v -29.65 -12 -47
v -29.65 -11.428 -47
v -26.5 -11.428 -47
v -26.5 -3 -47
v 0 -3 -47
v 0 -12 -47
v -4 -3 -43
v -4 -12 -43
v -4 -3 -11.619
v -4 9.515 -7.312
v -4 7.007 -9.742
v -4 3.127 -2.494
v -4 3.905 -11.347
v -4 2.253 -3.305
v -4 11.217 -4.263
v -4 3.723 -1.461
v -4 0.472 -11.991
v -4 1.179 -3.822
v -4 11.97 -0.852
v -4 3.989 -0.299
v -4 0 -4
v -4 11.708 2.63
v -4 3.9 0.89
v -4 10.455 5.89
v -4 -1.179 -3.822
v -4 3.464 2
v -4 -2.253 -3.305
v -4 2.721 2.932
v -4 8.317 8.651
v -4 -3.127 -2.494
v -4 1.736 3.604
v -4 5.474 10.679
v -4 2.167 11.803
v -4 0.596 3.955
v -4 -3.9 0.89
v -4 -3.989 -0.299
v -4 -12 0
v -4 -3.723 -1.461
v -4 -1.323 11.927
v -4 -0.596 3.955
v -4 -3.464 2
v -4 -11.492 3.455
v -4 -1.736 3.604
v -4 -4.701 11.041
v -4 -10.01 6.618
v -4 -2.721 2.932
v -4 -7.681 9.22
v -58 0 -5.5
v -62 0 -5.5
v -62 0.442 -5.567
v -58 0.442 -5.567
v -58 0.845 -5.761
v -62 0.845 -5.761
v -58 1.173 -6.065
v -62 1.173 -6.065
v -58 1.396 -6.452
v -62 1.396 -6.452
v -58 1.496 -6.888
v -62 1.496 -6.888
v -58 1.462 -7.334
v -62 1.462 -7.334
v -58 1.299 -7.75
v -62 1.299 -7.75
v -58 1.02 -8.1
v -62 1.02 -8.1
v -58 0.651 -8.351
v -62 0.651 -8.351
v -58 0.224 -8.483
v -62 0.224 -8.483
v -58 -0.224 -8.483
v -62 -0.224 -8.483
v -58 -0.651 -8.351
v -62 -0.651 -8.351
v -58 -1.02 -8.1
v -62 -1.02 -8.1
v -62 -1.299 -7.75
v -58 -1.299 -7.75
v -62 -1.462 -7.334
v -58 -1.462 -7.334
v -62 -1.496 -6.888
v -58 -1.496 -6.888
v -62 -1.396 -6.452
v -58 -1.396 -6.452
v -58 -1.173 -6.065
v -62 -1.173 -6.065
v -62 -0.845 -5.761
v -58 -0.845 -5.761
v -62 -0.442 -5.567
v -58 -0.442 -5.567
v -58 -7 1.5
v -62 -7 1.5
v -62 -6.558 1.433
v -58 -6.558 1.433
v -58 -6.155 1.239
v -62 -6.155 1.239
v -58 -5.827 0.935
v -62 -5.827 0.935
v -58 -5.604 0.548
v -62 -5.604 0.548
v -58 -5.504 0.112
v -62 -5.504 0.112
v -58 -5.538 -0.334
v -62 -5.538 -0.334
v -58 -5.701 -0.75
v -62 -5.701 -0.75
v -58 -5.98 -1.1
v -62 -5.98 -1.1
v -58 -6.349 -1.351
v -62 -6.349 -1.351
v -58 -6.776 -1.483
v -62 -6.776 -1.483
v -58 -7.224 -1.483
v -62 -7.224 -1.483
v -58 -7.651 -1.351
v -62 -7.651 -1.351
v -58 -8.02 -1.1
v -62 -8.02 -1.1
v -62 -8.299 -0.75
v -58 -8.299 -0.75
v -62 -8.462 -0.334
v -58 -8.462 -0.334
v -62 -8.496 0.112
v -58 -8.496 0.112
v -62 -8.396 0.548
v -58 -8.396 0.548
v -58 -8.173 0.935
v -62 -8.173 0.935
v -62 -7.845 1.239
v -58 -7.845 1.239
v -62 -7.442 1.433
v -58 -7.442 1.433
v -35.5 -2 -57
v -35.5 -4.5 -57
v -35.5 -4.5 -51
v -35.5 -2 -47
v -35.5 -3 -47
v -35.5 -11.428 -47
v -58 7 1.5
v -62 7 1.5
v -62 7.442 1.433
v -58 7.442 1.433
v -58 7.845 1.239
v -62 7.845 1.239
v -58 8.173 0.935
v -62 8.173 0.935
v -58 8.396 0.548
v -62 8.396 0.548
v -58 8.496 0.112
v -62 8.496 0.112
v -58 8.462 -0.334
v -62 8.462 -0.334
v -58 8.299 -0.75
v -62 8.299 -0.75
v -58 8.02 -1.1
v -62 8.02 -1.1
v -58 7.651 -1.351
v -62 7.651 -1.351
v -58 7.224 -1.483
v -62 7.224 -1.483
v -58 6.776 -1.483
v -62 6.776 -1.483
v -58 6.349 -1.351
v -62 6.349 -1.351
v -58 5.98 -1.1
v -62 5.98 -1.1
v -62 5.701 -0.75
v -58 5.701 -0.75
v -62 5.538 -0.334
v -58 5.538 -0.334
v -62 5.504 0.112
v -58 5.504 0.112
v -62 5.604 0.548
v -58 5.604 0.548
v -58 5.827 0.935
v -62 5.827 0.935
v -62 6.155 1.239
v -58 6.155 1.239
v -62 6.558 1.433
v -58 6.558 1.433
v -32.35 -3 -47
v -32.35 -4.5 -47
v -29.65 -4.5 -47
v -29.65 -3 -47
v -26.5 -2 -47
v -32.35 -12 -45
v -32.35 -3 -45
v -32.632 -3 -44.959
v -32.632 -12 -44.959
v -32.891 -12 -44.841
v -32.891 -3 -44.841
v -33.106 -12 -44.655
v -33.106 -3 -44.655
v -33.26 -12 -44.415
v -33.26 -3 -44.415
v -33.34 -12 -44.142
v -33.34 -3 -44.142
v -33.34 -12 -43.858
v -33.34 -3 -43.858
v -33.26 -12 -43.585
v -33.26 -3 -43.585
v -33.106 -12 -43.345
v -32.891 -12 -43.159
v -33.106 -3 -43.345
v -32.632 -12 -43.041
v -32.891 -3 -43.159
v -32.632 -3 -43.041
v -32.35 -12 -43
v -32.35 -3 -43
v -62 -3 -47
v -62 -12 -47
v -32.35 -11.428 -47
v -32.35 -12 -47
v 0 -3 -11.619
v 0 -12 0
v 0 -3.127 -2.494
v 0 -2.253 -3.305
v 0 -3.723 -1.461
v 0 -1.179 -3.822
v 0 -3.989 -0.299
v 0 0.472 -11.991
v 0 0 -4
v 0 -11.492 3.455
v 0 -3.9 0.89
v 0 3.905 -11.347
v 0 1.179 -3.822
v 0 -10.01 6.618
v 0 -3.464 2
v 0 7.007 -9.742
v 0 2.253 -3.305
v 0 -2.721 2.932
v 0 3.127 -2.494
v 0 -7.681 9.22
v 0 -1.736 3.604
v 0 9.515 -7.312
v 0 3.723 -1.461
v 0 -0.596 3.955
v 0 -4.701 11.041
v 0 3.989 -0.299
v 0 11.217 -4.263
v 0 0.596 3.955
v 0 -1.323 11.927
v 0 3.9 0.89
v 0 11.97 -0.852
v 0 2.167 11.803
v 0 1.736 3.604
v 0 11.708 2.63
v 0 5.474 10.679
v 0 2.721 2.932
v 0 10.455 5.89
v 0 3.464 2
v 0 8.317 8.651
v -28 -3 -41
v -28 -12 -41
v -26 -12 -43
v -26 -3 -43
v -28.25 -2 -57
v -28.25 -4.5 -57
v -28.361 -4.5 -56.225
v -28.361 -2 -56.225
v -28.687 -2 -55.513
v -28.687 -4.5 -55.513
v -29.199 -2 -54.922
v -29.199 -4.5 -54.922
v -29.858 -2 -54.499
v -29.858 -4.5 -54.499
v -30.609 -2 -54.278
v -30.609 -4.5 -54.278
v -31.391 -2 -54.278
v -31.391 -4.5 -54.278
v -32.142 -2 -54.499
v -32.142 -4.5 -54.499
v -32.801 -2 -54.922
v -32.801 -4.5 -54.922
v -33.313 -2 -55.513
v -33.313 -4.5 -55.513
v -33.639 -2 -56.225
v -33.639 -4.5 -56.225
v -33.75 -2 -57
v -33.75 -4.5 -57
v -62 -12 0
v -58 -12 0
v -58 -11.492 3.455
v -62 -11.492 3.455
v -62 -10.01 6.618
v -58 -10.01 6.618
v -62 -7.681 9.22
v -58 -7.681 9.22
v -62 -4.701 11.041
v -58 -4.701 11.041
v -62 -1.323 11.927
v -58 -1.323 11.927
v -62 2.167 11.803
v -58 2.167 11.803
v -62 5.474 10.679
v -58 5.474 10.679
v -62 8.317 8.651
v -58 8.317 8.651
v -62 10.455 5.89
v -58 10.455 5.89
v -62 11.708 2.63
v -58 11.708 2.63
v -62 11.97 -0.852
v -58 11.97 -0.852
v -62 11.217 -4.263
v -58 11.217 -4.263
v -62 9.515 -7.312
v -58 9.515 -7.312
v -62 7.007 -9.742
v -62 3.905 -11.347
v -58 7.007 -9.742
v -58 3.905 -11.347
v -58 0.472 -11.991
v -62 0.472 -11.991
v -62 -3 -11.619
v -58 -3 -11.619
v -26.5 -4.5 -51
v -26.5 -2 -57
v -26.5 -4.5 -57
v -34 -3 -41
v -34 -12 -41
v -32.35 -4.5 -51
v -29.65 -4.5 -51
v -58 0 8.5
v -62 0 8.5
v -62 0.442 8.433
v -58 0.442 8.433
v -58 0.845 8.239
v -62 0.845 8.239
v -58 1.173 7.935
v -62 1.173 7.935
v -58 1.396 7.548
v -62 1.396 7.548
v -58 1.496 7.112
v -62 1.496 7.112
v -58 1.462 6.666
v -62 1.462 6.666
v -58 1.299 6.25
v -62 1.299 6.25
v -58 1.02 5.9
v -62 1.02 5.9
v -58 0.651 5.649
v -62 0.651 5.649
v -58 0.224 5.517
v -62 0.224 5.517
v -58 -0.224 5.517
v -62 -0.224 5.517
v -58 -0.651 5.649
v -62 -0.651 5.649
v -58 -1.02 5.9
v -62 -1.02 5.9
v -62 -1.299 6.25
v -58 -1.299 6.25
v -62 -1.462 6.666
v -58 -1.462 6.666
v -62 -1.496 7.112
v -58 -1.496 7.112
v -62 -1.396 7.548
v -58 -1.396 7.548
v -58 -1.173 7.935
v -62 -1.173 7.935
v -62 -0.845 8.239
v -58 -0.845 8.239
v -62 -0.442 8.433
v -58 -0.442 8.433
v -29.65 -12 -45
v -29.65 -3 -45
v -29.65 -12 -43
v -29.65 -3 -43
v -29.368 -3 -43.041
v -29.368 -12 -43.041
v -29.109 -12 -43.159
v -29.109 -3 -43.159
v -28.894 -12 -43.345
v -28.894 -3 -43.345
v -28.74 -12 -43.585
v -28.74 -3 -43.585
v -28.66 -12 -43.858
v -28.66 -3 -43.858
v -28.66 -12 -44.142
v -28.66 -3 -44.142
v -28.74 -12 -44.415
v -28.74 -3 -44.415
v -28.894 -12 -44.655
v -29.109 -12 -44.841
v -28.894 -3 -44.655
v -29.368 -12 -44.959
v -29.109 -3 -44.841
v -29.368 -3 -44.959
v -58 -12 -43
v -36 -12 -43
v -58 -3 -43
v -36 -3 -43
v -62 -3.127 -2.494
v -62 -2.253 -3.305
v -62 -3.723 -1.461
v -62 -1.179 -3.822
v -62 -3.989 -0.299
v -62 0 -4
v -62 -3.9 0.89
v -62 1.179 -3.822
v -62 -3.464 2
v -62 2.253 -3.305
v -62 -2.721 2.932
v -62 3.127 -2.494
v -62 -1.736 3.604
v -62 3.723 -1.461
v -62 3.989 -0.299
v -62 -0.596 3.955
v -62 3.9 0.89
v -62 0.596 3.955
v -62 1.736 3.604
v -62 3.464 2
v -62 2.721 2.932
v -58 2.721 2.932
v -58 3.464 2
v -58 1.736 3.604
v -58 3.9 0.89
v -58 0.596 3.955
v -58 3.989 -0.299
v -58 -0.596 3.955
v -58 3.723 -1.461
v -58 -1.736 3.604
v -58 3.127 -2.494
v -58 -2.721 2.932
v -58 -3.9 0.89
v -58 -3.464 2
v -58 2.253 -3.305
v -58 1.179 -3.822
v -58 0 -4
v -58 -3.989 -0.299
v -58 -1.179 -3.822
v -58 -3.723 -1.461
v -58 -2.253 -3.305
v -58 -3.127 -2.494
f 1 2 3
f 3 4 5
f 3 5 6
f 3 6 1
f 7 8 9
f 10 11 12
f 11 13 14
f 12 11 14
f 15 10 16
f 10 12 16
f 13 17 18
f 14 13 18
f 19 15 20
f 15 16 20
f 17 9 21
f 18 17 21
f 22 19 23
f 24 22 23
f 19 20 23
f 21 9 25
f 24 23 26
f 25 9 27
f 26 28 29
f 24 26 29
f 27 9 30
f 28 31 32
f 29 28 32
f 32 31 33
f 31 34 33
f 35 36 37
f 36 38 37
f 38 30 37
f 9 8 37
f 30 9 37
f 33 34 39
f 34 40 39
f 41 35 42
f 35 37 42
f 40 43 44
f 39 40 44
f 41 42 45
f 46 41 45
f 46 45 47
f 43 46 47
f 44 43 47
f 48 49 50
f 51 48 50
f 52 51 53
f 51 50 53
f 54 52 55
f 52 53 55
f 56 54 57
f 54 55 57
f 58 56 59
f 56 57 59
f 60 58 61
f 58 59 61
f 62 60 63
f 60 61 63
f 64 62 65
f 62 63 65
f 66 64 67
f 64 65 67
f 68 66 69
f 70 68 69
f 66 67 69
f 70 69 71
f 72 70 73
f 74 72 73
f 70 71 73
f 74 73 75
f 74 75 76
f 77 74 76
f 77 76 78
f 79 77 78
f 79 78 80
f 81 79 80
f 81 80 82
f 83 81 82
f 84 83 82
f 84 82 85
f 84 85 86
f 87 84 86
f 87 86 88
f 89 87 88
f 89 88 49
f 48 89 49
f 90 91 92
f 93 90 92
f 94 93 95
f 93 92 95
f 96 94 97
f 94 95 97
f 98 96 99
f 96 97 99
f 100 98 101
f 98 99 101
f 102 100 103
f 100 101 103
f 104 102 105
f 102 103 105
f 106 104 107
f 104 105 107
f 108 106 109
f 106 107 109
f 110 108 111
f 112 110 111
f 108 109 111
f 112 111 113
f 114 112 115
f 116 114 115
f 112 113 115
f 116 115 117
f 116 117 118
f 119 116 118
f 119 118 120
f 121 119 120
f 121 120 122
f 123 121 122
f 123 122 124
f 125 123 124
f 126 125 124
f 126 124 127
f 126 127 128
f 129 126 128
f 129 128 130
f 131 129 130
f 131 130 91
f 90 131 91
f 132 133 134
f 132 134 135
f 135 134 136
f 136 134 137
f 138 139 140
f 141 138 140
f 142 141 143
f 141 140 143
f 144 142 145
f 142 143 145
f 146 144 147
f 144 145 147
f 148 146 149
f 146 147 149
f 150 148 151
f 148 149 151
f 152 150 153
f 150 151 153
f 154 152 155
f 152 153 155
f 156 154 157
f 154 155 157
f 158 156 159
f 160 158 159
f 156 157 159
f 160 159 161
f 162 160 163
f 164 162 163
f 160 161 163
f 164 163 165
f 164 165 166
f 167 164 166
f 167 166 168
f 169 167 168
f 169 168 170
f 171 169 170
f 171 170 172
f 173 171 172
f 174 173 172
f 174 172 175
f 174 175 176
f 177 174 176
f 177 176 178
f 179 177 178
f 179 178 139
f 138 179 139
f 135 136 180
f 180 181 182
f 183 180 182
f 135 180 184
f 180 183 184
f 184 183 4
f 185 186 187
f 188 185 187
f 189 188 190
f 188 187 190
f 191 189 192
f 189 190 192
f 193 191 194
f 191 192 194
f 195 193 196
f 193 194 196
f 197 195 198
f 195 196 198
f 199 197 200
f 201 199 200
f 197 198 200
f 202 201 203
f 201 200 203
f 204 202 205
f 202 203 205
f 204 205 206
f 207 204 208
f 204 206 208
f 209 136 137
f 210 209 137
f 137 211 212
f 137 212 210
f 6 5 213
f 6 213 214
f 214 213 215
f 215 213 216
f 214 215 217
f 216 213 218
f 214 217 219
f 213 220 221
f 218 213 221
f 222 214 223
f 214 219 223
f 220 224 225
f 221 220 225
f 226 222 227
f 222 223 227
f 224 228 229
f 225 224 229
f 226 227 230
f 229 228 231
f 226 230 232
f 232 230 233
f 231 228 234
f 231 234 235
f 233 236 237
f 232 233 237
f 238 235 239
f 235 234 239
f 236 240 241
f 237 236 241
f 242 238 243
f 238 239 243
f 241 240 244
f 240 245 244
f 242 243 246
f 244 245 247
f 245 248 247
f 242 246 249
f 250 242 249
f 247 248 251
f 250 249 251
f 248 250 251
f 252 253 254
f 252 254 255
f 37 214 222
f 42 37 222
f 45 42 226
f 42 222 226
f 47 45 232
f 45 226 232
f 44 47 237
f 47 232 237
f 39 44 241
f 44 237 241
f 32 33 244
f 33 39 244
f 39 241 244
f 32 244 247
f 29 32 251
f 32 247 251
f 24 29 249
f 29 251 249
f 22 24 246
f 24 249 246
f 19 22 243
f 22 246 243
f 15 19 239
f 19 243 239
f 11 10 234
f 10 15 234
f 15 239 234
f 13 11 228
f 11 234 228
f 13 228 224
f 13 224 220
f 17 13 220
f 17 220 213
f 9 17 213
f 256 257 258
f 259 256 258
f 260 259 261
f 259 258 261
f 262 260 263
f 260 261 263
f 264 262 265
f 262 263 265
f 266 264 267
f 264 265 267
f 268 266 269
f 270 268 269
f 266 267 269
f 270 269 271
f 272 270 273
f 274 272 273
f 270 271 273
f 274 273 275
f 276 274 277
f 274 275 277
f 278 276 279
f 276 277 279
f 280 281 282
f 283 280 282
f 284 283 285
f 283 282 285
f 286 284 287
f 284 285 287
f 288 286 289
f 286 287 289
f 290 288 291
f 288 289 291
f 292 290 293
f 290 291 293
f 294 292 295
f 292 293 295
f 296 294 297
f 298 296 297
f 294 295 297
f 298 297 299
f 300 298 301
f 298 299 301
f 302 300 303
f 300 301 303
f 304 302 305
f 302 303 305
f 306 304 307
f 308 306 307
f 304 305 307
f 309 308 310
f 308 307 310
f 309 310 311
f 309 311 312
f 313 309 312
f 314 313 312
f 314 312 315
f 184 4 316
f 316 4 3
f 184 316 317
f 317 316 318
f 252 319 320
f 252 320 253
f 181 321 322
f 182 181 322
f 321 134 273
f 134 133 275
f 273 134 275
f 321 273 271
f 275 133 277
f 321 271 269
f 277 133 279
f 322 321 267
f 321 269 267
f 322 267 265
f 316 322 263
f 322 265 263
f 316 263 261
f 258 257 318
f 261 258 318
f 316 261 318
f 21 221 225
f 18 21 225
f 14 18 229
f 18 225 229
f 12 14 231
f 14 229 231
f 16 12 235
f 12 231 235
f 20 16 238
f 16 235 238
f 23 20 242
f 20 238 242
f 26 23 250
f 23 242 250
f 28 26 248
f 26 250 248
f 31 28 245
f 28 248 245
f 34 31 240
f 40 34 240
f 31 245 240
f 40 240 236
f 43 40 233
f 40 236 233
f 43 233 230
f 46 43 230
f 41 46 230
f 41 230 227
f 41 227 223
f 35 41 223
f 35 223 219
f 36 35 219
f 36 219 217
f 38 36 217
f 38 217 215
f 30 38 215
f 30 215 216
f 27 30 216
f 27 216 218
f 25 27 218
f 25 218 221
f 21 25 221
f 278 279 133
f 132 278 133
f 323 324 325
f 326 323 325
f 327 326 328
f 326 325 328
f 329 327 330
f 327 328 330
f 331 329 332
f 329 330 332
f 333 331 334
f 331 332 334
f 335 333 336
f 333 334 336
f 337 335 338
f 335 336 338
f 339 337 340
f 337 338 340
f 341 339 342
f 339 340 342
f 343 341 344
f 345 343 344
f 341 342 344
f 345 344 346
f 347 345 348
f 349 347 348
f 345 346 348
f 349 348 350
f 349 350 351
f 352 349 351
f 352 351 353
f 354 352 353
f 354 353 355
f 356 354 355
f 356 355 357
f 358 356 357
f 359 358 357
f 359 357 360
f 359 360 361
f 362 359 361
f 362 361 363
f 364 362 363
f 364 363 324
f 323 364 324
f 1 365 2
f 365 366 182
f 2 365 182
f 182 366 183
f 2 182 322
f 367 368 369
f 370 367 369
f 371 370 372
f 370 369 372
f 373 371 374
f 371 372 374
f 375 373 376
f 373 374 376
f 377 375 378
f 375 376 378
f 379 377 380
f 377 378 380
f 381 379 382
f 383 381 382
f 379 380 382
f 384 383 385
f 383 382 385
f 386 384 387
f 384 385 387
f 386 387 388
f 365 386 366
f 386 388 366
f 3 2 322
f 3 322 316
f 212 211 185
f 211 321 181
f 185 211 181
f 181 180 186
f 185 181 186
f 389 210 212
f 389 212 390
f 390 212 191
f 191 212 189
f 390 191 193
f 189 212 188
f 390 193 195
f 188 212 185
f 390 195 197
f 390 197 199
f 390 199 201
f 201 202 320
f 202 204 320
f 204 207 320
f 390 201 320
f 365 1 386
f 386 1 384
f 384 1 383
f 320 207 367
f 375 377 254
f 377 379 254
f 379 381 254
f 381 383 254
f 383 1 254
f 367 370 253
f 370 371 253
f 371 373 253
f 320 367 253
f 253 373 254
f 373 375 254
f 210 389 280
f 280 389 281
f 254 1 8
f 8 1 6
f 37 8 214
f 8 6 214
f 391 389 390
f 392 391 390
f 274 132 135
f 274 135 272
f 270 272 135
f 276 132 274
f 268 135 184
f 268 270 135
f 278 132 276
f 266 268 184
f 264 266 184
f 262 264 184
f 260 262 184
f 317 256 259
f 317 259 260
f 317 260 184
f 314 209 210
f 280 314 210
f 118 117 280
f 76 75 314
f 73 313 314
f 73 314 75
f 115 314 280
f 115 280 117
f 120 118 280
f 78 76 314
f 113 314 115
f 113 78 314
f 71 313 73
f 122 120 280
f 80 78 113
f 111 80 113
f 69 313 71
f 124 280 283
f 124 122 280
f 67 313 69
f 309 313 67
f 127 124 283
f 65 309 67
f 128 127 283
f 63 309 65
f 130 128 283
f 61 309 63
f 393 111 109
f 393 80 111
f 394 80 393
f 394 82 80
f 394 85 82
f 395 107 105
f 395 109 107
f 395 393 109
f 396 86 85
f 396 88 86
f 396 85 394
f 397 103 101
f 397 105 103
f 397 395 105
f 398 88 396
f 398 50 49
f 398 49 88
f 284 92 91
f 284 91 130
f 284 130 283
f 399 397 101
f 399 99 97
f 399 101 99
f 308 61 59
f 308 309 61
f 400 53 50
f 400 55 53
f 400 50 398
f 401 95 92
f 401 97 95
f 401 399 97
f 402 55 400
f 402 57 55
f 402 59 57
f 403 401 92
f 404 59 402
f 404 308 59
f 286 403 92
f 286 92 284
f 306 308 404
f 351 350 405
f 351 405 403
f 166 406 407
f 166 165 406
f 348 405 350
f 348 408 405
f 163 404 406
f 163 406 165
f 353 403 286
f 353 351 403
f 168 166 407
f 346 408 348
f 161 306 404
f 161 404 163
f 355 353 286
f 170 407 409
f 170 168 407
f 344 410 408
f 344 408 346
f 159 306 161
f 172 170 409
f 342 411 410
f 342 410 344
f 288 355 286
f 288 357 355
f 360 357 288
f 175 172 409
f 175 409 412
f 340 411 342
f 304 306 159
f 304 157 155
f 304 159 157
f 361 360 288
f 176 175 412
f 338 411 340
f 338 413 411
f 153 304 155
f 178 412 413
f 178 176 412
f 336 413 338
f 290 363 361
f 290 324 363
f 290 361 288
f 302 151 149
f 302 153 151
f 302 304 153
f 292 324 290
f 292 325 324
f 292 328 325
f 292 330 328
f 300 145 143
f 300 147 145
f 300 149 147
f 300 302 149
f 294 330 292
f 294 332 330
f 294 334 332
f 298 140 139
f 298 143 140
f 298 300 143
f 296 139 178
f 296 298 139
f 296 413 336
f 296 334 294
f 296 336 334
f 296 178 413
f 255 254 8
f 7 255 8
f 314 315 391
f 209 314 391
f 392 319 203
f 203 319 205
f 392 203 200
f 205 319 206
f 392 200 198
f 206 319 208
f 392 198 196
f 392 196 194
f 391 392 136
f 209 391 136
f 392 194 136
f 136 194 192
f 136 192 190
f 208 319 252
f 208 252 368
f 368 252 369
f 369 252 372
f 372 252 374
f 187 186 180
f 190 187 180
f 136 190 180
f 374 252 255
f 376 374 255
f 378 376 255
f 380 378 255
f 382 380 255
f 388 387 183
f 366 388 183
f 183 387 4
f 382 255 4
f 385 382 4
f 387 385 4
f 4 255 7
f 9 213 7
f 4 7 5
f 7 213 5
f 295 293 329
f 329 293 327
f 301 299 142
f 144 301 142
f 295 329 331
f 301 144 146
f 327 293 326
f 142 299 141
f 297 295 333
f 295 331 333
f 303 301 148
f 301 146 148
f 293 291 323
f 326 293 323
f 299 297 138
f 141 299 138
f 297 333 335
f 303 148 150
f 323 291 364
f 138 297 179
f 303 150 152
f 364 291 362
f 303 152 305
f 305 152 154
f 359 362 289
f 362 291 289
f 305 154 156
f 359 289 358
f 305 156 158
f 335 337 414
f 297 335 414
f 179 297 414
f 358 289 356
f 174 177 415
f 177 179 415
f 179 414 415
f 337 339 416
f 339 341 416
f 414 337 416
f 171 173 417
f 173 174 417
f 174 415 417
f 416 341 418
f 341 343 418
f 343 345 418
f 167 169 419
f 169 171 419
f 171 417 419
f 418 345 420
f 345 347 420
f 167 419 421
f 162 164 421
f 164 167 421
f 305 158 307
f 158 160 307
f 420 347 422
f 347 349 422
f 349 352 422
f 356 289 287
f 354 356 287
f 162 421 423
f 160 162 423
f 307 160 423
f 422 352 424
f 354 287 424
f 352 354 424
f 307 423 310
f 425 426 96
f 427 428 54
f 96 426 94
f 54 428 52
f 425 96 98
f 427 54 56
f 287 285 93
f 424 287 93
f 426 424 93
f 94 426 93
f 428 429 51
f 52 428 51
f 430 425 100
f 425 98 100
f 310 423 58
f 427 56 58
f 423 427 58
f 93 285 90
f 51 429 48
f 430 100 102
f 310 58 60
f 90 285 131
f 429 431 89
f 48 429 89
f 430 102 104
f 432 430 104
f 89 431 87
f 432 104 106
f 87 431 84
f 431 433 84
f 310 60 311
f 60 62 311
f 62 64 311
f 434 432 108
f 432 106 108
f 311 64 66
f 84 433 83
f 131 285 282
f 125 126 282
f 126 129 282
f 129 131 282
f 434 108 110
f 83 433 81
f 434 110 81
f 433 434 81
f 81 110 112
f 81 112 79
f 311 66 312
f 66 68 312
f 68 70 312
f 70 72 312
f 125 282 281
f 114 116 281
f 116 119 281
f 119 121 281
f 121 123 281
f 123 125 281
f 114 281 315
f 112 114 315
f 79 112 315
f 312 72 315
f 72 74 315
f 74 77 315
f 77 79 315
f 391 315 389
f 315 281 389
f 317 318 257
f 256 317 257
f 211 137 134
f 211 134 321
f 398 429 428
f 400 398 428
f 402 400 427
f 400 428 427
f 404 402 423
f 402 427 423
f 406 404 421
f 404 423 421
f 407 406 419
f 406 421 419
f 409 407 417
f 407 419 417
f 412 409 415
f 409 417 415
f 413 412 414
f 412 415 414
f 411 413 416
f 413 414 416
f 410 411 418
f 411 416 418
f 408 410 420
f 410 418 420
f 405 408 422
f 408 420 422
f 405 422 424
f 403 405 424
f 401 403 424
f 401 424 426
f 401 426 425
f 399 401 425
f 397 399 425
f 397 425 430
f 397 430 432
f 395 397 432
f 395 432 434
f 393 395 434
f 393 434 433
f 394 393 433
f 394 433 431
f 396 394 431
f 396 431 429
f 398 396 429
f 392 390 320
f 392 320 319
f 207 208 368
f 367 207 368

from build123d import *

# Parameters (mm, degrees)
BOSS_EXTRUDE1_DEPTH      = 62
CUT_EXTRUDE1_DEPTH       = 12
CUT_EXTRUDE1_DEPTH_BACK  = 12
BOSS_EXTRUDE2_DEPTH      = 1
BOSS_EXTRUDE2_DEPTH_BACK = 1.5
CUT_EXTRUDE3_DEPTH       = 10
CHAMFER2_SIZE            = 2
CHAMFER3_SIZE            = 2
CHAMFER4_SIZE            = 4
CHAMFER4_SIZE2           = 6.92820323
SKETCH7_R                = 4
CUT_EXTRUDE4_DEPTH       = 70
CUT_EXTRUDE5_REACH       = 87.071
SKETCH8_R                = 1.5


with BuildPart() as part:
    # Sketch1 → Boss-Extrude1 (new body)
    with BuildSketch(Plane(origin=(0, 0, 0), x_dir=(0, 0, -1), z_dir=(1, 0, 0))):
        with BuildLine():
            Line((47, -12), (0, -12))
            ThreePointArc((0, -12), (-7.348469228, 9.486832981), (11.618950039, -3))
            Line((11.618950039, -3), (47, -3))
            Line((47, -3), (47, -12))
        make_face()
    extrude(amount=-BOSS_EXTRUDE1_DEPTH)

    # Sketch2 → Cut-Extrude1 (cut, two sides: drawn at the far end of the back side and taken through both)
    with BuildSketch(Plane(origin=(0, 0, 0), x_dir=(1, 0, 0), z_dir=(0, 1, 0)).offset(-CUT_EXTRUDE1_DEPTH_BACK)):
        Polygon((-58, -12), (-58, 43), (-36, 43), (-36, 41), (-26, 41), (-26, 43), (-4, 43), (-4, -12), align=None)
    extrude(amount=CUT_EXTRUDE1_DEPTH + CUT_EXTRUDE1_DEPTH_BACK, mode=Mode.SUBTRACT)

    # Sketch3 → Boss-Extrude2 (add, two sides: drawn at the far end of the back side and taken through both)
    with BuildSketch(Plane(origin=(0, -3, 0), x_dir=(1, 0, 0), z_dir=(0, 1, 0)).offset(-BOSS_EXTRUDE2_DEPTH_BACK)):
        with BuildLine():
            Line((-35.5, 57), (-35.5, 47))
            Line((-35.5, 47), (-26.5, 47))
            Line((-26.5, 47), (-26.5, 57))
            Line((-26.5, 57), (-28.25, 57))
            ThreePointArc((-28.25, 57), (-31, 54.25), (-33.75, 57))
            Line((-33.75, 57), (-35.5, 57))
        make_face()
    extrude(amount=BOSS_EXTRUDE2_DEPTH + BOSS_EXTRUDE2_DEPTH_BACK)

    # Sketch5 → Cut-Extrude3 (cut)
    with BuildSketch(Plane(origin=(0, -3, 0), x_dir=(1, 0, 0), z_dir=(0, 1, 0))):
        with BuildLine():
            Line((-32.35, 43), (-29.65, 43))
            ThreePointArc((-29.65, 43), (-28.65, 44), (-29.65, 45))
            Line((-29.65, 45), (-29.65, 47))
            Line((-29.65, 47), (-32.35, 47))
            Line((-32.35, 47), (-32.35, 45))
            ThreePointArc((-32.35, 45), (-33.35, 44), (-32.35, 43))
        make_face()
    extrude(amount=-CUT_EXTRUDE3_DEPTH, mode=Mode.SUBTRACT)

    # Chamfer2
    chamfer2_edges = [part.edges().sort_by_distance(p)[0] for p in [
        (-26, -7.5, -41),
    ]]
    chamfer(chamfer2_edges, length=CHAMFER2_SIZE - 0.0001)  # a hair under: the kernel refuses the full size

    # Chamfer3
    chamfer3_edges = [part.edges().sort_by_distance(p)[0] for p in [
        (-36, -7.5, -41),
    ]]
    chamfer(chamfer3_edges, length=CHAMFER3_SIZE - 0.0001)  # a hair under: the kernel refuses the full size

    # Chamfer4
    chamfer4_edges = [part.edges().sort_by_distance(p)[0] for p in [
        (-33.925, -4.5, -47),
        (-28.075, -4.5, -47),
    ]]
    chamfer4_side = [part.faces().sort_by_distance(p)[0] for p in [
        (-31, -4.5, -51.417170305),
    ]]
    chamfer(chamfer4_edges, length=CHAMFER4_SIZE, length2=CHAMFER4_SIZE2, reference=chamfer4_side[0])

    # Sketch7 → Cut-Extrude4 (cut)
    with BuildSketch(Plane(origin=(0, 0, 0), x_dir=(0, 0, -1), z_dir=(1, 0, 0))):
        Circle(SKETCH7_R)
    extrude(amount=-CUT_EXTRUDE4_DEPTH, mode=Mode.SUBTRACT)

    # Sketch8 → Cut-Extrude5 (cut, up to next)
    with BuildSketch(Plane.ZY.offset(62), mode=Mode.PRIVATE) as cut_extrude5_sk1:
        with Locations((0, 7)):
            Circle(SKETCH8_R)
    cut_extrude5_tool1 = extrude(cut_extrude5_sk1.sketch, amount=-CUT_EXTRUDE5_REACH, mode=Mode.PRIVATE) & part.part
    # Sketch8 → Cut-Extrude5 (cut, up to next)
    with BuildSketch(Plane.ZY.offset(62), mode=Mode.PRIVATE) as cut_extrude5_sk2:
        with Locations((7, 0)):
            Circle(SKETCH8_R)
    cut_extrude5_tool2 = extrude(cut_extrude5_sk2.sketch, amount=-CUT_EXTRUDE5_REACH, mode=Mode.PRIVATE) & part.part
    # Sketch8 → Cut-Extrude5 (cut, up to next)
    with BuildSketch(Plane.ZY.offset(62), mode=Mode.PRIVATE) as cut_extrude5_sk3:
        with Locations((0, -7)):
            Circle(SKETCH8_R)
    cut_extrude5_tool3 = extrude(cut_extrude5_sk3.sketch, amount=-CUT_EXTRUDE5_REACH, mode=Mode.PRIVATE) & part.part
    # Sketch8 → Cut-Extrude5 (cut, up to next)
    with BuildSketch(Plane.ZY.offset(62), mode=Mode.PRIVATE) as cut_extrude5_sk4:
        with Locations((-7, 0)):
            Circle(SKETCH8_R)
    cut_extrude5_tool4 = extrude(cut_extrude5_sk4.sketch, amount=-CUT_EXTRUDE5_REACH, mode=Mode.PRIVATE) & part.part
    add(cut_extrude5_tool1.solids().sort_by_distance((-62, 7, 0))[0], mode=Mode.SUBTRACT)
    add(cut_extrude5_tool2.solids().sort_by_distance((-62, 0, 7))[0], mode=Mode.SUBTRACT)
    add(cut_extrude5_tool3.solids().sort_by_distance((-62, -7, 0))[0], mode=Mode.SUBTRACT)
    add(cut_extrude5_tool4.solids().sort_by_distance((-62, 0, -7))[0], mode=Mode.SUBTRACT)


solid = part.part
